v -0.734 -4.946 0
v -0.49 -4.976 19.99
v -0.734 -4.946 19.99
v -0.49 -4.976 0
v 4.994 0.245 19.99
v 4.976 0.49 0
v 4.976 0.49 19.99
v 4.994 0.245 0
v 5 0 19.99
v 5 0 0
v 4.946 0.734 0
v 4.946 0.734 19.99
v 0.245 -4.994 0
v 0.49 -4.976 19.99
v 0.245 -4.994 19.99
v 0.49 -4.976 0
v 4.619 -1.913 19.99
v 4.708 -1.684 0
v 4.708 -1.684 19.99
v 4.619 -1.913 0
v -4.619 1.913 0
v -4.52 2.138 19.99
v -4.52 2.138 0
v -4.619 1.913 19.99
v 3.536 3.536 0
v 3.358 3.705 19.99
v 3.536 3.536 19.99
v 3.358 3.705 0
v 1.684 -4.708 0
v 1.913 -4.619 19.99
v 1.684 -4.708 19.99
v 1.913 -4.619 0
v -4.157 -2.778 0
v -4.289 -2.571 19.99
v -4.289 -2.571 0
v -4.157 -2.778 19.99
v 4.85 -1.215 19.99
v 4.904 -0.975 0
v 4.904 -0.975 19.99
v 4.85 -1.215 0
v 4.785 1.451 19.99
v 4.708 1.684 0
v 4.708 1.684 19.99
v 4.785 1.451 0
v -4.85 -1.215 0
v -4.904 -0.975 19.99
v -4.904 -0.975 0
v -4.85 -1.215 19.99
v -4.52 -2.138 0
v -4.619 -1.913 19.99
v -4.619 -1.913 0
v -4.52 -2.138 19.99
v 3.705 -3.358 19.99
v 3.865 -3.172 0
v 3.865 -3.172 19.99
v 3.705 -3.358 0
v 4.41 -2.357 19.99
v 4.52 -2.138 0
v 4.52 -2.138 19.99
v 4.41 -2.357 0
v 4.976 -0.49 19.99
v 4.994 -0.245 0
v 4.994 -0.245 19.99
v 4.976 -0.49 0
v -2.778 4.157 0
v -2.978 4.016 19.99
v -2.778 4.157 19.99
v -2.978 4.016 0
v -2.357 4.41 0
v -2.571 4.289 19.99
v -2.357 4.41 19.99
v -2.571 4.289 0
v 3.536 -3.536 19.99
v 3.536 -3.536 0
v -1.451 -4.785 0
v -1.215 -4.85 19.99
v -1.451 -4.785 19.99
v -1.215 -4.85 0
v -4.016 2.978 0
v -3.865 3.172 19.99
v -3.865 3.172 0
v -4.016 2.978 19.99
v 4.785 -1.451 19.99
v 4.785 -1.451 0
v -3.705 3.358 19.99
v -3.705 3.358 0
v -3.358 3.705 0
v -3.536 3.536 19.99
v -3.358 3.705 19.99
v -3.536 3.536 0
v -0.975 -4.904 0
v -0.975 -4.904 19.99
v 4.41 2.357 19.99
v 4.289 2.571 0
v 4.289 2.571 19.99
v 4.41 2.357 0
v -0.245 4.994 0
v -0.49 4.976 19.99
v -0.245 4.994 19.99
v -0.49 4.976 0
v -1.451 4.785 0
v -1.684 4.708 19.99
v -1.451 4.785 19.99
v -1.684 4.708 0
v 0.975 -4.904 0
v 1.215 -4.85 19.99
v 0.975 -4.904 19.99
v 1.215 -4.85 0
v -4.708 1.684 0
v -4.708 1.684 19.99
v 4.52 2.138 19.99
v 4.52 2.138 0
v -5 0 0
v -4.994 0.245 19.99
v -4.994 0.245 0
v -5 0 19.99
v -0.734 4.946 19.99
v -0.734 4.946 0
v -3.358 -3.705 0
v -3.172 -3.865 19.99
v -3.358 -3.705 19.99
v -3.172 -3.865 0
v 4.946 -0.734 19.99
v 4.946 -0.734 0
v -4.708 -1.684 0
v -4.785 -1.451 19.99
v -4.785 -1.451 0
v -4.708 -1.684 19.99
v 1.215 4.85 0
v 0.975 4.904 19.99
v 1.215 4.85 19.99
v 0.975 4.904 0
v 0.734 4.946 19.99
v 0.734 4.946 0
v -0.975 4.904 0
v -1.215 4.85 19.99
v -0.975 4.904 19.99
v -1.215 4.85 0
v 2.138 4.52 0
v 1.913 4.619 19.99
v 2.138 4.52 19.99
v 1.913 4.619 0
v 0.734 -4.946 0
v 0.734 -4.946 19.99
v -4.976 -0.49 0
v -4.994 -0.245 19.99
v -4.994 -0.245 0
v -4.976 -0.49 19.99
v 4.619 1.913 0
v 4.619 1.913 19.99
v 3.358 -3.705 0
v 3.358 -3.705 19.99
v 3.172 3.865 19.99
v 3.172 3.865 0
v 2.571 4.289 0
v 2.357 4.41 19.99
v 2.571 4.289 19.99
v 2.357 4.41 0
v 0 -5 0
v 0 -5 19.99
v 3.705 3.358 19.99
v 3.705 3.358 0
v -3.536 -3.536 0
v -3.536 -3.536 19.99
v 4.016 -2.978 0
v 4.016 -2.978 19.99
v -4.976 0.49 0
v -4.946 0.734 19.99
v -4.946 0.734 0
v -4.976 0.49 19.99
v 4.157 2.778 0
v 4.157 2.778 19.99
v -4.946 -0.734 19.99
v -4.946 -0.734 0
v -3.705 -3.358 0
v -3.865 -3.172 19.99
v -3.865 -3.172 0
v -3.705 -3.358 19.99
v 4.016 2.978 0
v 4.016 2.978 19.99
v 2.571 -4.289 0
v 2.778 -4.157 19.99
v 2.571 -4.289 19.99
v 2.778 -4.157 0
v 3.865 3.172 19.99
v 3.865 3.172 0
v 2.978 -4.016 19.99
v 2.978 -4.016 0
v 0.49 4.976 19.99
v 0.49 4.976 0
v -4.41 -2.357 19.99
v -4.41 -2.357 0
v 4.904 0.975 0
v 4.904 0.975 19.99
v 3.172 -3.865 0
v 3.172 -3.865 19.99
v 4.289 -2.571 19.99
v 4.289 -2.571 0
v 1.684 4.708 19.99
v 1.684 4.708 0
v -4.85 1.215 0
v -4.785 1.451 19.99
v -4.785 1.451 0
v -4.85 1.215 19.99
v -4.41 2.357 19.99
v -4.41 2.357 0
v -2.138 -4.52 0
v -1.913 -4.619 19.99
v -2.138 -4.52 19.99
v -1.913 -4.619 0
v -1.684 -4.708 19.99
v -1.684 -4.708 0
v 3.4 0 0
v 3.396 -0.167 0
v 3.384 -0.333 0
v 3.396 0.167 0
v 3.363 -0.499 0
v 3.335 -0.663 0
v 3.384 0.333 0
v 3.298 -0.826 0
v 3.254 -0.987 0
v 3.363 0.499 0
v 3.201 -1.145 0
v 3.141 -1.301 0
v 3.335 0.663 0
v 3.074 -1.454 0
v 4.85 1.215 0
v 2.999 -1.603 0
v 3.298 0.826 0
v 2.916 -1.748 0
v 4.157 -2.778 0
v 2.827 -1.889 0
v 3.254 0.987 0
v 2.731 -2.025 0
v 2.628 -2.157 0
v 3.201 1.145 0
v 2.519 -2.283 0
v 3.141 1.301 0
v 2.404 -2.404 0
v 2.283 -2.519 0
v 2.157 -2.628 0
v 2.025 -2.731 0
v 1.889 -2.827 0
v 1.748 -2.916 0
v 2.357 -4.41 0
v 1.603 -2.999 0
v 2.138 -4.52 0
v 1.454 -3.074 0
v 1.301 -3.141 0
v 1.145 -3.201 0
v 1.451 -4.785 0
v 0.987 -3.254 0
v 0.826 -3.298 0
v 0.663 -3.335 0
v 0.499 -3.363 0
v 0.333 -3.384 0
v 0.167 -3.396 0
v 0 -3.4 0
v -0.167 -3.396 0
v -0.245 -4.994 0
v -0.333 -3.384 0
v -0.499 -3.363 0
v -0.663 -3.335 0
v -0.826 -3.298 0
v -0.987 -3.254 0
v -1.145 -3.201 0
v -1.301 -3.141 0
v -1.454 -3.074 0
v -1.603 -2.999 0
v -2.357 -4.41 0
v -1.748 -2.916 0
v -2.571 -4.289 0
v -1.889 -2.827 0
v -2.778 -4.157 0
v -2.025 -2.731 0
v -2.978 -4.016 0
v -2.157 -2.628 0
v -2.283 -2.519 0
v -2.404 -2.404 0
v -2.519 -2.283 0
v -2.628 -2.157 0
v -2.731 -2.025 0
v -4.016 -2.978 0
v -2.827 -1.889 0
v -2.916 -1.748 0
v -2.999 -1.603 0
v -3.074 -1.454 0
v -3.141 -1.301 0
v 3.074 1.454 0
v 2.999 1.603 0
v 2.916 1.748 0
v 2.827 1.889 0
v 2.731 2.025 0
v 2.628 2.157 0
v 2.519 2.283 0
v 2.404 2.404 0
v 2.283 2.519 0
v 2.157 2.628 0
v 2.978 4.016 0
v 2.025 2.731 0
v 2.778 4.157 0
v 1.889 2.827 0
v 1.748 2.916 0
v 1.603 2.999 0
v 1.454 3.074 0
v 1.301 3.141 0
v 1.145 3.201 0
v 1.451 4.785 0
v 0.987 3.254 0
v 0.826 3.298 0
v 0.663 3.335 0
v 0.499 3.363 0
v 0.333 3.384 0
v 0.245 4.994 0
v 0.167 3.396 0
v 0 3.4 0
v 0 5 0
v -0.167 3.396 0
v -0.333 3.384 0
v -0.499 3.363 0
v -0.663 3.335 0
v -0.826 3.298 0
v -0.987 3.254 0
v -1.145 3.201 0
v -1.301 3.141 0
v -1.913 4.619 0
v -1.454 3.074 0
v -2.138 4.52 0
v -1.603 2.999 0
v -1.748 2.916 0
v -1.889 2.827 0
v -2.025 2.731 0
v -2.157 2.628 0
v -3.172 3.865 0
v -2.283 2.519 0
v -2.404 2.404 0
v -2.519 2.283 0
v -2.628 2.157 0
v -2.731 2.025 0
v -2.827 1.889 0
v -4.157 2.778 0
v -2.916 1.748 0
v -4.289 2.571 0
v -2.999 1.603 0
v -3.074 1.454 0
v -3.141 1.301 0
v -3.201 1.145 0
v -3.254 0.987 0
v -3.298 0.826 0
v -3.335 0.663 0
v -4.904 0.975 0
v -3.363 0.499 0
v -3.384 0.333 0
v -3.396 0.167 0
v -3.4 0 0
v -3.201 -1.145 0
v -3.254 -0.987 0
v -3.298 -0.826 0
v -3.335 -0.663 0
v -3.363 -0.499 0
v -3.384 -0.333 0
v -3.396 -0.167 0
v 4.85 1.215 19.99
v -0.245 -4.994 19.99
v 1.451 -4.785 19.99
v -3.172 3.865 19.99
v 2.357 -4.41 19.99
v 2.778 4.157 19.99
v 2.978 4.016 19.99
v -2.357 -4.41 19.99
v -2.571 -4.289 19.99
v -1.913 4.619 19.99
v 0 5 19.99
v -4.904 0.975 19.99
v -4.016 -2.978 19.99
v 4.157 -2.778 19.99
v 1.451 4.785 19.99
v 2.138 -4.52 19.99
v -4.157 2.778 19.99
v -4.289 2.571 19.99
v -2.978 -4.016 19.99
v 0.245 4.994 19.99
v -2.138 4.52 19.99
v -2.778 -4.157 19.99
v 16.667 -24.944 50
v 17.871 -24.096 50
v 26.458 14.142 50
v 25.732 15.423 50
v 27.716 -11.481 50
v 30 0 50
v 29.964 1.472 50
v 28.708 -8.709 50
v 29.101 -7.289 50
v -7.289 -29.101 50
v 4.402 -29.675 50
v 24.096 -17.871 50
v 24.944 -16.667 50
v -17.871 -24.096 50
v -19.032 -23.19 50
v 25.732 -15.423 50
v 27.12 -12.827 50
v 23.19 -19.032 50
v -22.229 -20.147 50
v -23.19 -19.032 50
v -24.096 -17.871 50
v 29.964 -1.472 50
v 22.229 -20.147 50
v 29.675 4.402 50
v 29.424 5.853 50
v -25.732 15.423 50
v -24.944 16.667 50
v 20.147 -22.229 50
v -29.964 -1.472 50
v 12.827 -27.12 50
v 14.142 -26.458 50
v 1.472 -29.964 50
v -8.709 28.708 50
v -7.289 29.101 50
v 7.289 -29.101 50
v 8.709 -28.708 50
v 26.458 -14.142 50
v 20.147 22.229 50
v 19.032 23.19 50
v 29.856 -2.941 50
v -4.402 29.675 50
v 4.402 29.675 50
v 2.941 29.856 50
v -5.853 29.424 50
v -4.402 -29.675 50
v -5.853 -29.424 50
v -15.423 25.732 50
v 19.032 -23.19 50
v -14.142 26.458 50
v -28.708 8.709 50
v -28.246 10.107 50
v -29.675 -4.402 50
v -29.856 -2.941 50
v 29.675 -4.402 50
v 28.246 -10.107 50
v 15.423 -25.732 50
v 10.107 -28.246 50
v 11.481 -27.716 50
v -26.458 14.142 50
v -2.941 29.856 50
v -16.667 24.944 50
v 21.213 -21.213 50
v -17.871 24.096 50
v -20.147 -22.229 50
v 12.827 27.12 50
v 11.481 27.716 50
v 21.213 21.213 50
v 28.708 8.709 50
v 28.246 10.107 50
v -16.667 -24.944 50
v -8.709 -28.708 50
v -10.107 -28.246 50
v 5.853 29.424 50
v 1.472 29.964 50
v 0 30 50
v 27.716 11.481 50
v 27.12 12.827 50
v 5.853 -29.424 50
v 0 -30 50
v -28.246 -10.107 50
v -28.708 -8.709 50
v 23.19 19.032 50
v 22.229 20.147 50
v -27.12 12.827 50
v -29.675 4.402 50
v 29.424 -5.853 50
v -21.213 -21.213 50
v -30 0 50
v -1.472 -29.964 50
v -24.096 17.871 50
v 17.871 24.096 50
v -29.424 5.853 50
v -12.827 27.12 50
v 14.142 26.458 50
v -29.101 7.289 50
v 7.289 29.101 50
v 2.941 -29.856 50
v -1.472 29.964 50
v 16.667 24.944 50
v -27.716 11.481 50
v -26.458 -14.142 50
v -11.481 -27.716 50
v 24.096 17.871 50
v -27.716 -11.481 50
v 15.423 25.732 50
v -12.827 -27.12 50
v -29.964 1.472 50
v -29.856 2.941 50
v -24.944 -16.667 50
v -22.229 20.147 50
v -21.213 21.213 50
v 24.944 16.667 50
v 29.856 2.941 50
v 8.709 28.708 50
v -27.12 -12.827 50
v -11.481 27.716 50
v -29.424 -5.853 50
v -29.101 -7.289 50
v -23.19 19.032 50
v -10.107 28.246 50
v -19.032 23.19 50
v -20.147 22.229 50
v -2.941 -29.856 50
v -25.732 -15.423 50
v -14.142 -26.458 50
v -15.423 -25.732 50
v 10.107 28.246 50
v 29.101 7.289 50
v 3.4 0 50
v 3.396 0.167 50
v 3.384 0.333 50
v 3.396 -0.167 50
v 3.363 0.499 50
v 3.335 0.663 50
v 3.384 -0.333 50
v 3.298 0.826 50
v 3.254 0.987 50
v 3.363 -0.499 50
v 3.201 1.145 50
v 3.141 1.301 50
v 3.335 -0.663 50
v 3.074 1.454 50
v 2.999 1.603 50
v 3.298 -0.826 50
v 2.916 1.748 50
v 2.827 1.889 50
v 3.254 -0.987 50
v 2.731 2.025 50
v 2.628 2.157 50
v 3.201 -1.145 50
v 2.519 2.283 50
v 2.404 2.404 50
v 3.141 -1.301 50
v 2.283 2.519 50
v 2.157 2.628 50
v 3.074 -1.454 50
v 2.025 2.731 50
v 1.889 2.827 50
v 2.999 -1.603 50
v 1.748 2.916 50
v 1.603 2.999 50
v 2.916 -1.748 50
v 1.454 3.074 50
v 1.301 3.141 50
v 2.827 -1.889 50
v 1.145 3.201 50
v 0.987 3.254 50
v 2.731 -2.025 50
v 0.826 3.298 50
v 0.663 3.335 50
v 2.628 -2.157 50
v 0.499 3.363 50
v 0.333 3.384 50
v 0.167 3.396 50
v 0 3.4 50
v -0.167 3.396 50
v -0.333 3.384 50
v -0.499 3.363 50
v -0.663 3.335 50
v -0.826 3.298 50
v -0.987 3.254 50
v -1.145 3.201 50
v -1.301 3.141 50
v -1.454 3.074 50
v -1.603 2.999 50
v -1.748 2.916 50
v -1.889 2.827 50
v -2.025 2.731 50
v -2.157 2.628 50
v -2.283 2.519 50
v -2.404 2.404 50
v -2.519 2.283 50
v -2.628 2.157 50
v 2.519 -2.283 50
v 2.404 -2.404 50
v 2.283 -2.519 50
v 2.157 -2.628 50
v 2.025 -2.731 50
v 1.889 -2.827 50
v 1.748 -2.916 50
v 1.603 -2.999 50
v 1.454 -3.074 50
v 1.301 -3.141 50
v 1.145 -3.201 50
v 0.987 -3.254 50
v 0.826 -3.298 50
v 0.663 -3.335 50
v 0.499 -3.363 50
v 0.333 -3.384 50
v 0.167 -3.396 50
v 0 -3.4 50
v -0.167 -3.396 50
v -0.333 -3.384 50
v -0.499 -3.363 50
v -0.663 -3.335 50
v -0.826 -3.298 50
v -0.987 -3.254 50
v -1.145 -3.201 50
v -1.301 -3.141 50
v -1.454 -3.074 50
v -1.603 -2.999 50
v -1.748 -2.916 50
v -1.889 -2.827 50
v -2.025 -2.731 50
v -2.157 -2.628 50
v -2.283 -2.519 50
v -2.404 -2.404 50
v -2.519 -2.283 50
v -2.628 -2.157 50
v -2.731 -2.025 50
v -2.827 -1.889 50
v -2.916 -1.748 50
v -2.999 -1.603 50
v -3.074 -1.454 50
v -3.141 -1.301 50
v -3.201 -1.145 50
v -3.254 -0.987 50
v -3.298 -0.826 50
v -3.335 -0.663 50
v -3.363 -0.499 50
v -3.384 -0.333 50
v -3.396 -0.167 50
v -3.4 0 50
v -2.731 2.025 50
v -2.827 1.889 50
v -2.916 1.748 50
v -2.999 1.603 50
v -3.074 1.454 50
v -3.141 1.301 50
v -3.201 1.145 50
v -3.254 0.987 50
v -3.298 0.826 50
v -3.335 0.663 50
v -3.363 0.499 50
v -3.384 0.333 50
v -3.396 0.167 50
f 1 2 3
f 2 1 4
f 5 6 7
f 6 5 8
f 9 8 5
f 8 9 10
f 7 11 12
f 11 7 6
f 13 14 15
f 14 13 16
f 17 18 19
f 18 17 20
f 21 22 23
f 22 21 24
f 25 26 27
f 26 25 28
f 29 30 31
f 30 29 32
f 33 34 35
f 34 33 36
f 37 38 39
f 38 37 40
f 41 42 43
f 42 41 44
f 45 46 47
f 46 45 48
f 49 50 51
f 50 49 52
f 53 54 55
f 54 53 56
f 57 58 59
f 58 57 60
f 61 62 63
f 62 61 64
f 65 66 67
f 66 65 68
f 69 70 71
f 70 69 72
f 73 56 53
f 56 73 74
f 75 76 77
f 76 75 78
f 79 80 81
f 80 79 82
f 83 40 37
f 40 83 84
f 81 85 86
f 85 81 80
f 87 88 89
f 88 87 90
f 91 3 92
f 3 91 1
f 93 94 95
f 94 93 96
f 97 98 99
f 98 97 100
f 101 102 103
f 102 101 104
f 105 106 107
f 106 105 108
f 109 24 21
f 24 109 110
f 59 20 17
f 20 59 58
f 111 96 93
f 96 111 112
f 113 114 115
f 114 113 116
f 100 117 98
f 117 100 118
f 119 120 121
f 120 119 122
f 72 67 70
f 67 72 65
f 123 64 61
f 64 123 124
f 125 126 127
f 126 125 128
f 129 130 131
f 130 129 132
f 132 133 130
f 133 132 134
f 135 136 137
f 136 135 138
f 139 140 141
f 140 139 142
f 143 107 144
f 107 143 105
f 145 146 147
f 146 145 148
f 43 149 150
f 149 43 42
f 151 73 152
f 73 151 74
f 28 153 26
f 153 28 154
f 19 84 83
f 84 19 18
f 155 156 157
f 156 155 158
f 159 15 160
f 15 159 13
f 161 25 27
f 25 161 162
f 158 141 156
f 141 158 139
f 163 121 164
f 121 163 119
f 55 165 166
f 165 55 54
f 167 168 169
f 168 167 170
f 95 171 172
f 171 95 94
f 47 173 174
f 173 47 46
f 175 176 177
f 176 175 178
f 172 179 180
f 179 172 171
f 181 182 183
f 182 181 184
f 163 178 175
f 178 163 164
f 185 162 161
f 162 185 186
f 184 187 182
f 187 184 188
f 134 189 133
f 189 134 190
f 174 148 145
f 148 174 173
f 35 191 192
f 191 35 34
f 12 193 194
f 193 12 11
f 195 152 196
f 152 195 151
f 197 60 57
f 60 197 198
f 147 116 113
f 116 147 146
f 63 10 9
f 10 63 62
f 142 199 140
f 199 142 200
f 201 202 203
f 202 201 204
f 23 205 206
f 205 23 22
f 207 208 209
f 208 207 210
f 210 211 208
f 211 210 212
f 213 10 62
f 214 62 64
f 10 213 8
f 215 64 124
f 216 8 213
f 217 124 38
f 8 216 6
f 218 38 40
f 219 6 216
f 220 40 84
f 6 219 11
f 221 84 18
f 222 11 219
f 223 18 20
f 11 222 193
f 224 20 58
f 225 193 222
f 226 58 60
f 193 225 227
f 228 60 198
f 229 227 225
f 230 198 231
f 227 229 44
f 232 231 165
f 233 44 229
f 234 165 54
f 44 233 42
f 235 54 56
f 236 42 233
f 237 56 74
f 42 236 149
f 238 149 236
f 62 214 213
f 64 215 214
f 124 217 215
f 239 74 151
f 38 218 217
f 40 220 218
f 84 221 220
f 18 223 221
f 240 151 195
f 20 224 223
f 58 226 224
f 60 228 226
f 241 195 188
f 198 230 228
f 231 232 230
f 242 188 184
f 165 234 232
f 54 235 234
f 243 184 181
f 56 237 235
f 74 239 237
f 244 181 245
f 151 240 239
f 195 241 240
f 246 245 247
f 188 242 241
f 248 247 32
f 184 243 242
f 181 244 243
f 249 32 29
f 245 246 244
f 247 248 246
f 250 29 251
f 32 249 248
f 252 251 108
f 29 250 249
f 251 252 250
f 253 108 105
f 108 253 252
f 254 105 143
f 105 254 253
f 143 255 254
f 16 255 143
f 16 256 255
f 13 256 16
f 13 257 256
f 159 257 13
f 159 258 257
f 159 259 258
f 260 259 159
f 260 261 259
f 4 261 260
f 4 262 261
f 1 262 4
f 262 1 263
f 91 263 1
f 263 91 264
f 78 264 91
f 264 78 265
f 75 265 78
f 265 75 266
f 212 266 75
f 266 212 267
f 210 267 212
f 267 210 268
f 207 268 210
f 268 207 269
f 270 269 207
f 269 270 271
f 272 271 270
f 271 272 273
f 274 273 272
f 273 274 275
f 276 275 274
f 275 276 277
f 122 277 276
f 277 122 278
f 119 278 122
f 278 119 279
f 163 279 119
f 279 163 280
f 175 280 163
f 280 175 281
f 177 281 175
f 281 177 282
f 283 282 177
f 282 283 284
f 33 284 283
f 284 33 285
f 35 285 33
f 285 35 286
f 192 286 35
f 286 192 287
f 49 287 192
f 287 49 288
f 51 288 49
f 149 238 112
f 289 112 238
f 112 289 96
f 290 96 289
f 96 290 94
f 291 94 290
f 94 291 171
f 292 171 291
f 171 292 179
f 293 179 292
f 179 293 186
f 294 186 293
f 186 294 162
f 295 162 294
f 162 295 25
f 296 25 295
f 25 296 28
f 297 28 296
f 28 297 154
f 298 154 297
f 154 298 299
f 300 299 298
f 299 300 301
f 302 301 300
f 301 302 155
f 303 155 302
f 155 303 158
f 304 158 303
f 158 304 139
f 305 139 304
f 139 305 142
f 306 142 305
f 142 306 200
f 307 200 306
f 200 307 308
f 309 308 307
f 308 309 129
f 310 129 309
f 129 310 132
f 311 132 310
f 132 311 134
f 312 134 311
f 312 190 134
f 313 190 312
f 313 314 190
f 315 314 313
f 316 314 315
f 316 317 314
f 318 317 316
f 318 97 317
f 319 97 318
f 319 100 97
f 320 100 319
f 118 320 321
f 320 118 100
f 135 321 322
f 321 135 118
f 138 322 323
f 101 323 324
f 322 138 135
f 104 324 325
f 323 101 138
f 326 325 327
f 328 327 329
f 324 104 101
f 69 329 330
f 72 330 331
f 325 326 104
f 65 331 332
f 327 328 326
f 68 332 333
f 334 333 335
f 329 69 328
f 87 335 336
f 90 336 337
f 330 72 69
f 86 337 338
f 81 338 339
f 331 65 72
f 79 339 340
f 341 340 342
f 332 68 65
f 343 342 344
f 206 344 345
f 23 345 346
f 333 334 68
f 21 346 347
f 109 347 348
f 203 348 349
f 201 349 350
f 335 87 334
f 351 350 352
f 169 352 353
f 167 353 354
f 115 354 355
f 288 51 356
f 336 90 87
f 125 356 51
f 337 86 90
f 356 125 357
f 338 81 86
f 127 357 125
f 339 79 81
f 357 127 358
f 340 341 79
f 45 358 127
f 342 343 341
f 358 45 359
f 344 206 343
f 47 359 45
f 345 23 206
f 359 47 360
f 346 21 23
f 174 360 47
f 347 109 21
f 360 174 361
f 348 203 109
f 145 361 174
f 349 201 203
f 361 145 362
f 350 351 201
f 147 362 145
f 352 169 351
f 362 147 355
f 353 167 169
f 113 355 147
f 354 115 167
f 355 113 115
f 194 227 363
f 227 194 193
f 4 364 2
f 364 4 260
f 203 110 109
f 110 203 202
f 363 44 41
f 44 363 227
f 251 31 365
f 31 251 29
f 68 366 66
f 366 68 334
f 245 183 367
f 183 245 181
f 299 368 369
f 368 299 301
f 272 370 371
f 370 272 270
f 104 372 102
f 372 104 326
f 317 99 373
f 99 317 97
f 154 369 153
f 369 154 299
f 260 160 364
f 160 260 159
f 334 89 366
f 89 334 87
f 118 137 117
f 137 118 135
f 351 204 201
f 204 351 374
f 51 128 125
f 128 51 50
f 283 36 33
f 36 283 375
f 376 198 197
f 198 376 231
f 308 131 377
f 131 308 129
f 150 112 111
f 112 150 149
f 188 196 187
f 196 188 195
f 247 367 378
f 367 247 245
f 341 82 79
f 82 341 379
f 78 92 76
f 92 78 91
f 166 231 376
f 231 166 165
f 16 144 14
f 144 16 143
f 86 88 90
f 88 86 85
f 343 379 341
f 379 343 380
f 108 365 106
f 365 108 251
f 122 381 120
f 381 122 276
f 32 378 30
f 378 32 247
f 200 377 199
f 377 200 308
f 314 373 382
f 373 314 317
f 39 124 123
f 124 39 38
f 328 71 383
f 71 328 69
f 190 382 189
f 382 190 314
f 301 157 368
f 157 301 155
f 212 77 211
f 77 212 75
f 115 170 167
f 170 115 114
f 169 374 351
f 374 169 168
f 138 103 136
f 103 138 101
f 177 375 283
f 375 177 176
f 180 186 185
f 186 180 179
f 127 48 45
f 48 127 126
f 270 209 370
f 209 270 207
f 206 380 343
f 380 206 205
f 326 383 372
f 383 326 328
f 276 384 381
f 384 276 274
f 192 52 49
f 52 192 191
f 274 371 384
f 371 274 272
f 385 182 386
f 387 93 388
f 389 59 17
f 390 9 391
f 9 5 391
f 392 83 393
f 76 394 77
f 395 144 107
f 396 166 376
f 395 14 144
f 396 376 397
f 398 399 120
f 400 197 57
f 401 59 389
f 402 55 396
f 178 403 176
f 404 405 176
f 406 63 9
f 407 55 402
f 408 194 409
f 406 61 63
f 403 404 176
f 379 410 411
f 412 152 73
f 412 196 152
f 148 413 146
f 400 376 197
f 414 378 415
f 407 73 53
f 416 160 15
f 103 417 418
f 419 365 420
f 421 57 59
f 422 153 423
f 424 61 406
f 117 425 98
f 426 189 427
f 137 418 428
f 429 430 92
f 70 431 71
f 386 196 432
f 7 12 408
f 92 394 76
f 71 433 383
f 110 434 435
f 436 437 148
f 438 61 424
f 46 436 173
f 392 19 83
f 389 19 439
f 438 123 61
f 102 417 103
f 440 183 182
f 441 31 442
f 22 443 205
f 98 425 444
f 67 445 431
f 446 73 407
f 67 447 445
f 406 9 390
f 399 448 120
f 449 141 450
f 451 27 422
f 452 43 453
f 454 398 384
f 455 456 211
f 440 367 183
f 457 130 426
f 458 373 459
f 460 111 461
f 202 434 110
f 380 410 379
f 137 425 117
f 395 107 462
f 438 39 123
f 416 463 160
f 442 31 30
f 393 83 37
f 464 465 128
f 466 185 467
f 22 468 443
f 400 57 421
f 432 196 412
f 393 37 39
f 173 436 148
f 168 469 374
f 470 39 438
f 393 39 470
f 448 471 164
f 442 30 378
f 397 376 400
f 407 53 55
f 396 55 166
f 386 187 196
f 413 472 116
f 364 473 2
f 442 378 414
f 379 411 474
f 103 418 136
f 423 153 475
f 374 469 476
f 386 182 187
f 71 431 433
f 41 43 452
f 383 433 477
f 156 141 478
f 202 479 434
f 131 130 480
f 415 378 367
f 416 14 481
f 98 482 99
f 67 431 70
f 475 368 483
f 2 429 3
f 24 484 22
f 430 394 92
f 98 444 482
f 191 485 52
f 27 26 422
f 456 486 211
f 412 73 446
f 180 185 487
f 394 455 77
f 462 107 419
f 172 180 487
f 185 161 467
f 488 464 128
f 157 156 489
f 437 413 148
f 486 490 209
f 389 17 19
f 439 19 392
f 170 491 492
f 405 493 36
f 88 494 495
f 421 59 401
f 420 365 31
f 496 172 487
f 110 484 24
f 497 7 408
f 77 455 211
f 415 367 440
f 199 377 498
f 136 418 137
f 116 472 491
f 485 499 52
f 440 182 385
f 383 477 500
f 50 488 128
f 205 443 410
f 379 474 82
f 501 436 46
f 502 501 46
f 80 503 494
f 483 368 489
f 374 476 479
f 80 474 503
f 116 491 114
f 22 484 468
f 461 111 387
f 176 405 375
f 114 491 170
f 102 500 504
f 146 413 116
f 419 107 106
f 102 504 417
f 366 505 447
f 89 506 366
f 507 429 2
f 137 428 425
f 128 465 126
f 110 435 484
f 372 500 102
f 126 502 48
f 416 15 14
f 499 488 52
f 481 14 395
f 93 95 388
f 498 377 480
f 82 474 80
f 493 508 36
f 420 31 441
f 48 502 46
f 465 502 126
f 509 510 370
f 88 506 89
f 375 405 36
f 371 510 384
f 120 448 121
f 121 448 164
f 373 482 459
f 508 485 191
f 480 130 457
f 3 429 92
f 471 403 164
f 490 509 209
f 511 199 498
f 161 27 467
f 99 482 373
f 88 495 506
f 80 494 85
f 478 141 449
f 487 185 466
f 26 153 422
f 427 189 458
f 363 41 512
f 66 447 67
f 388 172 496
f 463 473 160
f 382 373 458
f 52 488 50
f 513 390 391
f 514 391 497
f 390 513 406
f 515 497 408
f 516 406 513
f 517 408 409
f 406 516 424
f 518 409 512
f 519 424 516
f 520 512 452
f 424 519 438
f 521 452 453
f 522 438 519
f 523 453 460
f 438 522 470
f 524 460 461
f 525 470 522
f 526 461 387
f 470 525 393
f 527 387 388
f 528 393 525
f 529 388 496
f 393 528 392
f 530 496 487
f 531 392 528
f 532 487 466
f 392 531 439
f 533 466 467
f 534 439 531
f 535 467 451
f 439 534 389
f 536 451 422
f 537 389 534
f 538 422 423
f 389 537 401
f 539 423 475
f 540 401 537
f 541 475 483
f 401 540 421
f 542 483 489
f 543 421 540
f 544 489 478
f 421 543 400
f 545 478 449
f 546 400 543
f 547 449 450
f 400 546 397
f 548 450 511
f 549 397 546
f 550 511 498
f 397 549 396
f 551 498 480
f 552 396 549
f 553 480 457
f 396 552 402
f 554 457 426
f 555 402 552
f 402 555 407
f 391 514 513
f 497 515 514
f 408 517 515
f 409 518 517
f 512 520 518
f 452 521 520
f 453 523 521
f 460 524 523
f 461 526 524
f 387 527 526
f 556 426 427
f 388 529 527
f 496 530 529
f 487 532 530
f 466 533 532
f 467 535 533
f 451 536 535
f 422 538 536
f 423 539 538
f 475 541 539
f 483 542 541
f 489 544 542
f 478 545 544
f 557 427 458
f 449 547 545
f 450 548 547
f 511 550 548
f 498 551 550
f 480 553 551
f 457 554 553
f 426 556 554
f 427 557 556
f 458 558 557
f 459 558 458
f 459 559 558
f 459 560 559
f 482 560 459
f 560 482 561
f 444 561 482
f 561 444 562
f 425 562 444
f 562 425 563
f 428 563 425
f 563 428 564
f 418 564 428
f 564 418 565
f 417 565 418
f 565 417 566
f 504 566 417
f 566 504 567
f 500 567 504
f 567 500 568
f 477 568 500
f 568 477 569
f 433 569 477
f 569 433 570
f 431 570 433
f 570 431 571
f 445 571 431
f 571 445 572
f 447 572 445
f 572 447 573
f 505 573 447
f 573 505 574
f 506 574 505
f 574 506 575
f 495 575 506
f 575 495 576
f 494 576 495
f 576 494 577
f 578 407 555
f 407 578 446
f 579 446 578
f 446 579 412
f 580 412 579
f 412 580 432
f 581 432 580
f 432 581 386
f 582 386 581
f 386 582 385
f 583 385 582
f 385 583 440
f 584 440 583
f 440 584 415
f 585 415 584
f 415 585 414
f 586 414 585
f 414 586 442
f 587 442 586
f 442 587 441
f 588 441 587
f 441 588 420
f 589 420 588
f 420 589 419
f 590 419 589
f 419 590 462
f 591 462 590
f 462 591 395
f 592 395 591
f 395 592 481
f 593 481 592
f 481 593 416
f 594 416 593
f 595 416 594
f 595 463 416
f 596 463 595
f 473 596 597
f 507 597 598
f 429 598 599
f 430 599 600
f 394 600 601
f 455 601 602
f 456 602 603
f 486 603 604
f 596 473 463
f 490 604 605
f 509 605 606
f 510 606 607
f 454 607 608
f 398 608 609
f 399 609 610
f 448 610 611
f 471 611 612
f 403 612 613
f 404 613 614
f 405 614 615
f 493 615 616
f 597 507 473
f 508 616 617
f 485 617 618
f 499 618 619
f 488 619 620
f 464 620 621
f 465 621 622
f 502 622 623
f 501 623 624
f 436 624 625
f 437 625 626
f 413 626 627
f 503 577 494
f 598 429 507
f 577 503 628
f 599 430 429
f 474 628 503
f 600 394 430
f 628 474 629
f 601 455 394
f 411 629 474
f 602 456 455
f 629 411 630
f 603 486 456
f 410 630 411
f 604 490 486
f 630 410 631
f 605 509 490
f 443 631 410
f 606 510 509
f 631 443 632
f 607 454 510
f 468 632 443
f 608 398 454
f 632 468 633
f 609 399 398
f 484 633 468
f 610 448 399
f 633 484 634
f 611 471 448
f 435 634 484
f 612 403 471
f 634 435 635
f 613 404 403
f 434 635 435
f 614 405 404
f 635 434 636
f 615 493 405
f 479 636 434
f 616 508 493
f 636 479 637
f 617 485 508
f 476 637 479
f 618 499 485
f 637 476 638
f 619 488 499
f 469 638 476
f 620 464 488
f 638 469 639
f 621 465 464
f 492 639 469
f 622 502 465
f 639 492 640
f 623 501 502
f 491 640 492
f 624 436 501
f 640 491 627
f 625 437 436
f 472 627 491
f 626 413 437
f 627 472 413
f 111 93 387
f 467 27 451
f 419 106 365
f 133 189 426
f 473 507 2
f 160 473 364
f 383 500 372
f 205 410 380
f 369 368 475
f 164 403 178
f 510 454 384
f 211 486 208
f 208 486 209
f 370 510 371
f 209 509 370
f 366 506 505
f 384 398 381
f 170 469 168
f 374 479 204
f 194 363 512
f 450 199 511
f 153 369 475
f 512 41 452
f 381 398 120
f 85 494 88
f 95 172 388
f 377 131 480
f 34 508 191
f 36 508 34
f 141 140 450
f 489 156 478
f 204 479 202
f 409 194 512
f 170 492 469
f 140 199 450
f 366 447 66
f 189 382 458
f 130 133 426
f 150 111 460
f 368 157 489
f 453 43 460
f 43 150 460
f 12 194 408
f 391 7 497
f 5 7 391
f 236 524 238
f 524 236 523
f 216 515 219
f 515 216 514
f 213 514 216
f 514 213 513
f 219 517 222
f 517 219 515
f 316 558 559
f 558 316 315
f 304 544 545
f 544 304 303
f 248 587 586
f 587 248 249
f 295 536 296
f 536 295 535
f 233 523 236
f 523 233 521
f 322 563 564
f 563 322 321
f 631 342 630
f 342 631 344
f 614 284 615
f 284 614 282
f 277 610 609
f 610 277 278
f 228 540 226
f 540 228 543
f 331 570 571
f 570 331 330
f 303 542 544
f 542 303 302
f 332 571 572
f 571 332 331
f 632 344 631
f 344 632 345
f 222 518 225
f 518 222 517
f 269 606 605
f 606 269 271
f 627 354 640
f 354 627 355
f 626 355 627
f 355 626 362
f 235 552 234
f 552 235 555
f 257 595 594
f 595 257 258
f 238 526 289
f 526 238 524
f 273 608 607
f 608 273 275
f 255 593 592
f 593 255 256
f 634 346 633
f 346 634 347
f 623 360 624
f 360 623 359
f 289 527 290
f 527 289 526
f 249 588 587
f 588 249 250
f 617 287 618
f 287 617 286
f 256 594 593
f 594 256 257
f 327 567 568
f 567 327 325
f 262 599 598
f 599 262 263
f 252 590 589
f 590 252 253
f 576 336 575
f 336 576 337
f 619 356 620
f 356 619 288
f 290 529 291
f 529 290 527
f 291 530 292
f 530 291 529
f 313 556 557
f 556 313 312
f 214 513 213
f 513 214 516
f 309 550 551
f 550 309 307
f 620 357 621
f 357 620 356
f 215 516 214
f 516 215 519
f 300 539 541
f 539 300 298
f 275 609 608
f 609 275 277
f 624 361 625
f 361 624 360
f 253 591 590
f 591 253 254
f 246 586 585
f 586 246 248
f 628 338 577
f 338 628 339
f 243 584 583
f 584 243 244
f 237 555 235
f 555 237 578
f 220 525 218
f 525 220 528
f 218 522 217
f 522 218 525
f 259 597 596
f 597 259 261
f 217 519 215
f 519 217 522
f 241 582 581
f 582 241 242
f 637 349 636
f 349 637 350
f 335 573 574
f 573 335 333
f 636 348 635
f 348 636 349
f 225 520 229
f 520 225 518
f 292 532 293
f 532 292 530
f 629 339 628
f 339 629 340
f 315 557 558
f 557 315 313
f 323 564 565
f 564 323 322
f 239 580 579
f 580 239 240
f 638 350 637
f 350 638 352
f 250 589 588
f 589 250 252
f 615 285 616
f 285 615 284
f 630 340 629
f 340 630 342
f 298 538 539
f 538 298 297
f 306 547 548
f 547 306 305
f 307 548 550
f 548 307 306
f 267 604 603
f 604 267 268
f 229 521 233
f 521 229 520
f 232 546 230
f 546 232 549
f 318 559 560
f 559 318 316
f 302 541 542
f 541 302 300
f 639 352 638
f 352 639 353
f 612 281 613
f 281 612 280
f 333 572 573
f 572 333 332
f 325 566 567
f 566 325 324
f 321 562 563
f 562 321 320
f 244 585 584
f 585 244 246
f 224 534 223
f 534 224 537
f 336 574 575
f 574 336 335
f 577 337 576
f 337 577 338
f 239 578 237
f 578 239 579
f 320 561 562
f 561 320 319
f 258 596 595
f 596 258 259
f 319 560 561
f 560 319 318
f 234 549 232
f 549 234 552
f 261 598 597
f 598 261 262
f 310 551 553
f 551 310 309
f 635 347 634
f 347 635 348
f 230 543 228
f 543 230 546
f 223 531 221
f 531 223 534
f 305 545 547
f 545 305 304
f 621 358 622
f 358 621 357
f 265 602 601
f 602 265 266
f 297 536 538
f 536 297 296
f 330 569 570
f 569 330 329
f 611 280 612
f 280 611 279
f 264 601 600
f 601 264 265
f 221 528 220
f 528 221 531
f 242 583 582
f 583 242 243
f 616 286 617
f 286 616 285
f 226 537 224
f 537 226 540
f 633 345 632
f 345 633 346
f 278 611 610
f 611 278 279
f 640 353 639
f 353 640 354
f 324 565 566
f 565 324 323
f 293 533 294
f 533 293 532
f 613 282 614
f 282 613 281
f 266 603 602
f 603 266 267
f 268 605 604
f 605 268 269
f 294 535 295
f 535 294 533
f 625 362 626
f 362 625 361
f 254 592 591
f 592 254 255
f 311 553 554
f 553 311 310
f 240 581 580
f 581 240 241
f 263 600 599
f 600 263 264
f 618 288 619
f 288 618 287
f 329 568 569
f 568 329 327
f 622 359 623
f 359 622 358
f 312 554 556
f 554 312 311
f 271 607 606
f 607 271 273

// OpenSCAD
// Small lab funnel, printed upright (wide opening at the top)
// All dimensions in millimetres

// ---- Parameters ----
spout_od      = 10;    // spout outer diameter
spout_length  = 20;    // spout runs from z = 0 to z = 20
cone_bottom_d = 10;    // cone outer diameter at z = 20
cone_top_d    = 60;    // cone outer diameter at the rim (z = 50)
rim_z         = 50;    // height of the funnel rim
wall          = 1.6;   // wall thickness everywhere

$fn = 128;             // smoothness of curved surfaces

// ---- Derived ----
spout_id = spout_od - 2 * wall;   // spout bore = 6.8 mm
cone_h   = rim_z - spout_length;  // cone height = 30 mm

// ---- Model ----
difference() {
    union() {
        // Straight spout from z = 0 to z = 20
        cylinder(d = spout_od, h = spout_length);

        // Cone from z = 20 to z = 50 (overlaps slightly into spout for a clean union)
        translate([0, 0, spout_length - 0.01])
            cylinder(d1 = cone_bottom_d, d2 = cone_top_d, h = cone_h + 0.01);
    }

    // Hollow out the bore through the full height (open bottom and open top)
    translate([0, 0, -1])
        cylinder(d = spout_id, h = rim_z + 2);
}
